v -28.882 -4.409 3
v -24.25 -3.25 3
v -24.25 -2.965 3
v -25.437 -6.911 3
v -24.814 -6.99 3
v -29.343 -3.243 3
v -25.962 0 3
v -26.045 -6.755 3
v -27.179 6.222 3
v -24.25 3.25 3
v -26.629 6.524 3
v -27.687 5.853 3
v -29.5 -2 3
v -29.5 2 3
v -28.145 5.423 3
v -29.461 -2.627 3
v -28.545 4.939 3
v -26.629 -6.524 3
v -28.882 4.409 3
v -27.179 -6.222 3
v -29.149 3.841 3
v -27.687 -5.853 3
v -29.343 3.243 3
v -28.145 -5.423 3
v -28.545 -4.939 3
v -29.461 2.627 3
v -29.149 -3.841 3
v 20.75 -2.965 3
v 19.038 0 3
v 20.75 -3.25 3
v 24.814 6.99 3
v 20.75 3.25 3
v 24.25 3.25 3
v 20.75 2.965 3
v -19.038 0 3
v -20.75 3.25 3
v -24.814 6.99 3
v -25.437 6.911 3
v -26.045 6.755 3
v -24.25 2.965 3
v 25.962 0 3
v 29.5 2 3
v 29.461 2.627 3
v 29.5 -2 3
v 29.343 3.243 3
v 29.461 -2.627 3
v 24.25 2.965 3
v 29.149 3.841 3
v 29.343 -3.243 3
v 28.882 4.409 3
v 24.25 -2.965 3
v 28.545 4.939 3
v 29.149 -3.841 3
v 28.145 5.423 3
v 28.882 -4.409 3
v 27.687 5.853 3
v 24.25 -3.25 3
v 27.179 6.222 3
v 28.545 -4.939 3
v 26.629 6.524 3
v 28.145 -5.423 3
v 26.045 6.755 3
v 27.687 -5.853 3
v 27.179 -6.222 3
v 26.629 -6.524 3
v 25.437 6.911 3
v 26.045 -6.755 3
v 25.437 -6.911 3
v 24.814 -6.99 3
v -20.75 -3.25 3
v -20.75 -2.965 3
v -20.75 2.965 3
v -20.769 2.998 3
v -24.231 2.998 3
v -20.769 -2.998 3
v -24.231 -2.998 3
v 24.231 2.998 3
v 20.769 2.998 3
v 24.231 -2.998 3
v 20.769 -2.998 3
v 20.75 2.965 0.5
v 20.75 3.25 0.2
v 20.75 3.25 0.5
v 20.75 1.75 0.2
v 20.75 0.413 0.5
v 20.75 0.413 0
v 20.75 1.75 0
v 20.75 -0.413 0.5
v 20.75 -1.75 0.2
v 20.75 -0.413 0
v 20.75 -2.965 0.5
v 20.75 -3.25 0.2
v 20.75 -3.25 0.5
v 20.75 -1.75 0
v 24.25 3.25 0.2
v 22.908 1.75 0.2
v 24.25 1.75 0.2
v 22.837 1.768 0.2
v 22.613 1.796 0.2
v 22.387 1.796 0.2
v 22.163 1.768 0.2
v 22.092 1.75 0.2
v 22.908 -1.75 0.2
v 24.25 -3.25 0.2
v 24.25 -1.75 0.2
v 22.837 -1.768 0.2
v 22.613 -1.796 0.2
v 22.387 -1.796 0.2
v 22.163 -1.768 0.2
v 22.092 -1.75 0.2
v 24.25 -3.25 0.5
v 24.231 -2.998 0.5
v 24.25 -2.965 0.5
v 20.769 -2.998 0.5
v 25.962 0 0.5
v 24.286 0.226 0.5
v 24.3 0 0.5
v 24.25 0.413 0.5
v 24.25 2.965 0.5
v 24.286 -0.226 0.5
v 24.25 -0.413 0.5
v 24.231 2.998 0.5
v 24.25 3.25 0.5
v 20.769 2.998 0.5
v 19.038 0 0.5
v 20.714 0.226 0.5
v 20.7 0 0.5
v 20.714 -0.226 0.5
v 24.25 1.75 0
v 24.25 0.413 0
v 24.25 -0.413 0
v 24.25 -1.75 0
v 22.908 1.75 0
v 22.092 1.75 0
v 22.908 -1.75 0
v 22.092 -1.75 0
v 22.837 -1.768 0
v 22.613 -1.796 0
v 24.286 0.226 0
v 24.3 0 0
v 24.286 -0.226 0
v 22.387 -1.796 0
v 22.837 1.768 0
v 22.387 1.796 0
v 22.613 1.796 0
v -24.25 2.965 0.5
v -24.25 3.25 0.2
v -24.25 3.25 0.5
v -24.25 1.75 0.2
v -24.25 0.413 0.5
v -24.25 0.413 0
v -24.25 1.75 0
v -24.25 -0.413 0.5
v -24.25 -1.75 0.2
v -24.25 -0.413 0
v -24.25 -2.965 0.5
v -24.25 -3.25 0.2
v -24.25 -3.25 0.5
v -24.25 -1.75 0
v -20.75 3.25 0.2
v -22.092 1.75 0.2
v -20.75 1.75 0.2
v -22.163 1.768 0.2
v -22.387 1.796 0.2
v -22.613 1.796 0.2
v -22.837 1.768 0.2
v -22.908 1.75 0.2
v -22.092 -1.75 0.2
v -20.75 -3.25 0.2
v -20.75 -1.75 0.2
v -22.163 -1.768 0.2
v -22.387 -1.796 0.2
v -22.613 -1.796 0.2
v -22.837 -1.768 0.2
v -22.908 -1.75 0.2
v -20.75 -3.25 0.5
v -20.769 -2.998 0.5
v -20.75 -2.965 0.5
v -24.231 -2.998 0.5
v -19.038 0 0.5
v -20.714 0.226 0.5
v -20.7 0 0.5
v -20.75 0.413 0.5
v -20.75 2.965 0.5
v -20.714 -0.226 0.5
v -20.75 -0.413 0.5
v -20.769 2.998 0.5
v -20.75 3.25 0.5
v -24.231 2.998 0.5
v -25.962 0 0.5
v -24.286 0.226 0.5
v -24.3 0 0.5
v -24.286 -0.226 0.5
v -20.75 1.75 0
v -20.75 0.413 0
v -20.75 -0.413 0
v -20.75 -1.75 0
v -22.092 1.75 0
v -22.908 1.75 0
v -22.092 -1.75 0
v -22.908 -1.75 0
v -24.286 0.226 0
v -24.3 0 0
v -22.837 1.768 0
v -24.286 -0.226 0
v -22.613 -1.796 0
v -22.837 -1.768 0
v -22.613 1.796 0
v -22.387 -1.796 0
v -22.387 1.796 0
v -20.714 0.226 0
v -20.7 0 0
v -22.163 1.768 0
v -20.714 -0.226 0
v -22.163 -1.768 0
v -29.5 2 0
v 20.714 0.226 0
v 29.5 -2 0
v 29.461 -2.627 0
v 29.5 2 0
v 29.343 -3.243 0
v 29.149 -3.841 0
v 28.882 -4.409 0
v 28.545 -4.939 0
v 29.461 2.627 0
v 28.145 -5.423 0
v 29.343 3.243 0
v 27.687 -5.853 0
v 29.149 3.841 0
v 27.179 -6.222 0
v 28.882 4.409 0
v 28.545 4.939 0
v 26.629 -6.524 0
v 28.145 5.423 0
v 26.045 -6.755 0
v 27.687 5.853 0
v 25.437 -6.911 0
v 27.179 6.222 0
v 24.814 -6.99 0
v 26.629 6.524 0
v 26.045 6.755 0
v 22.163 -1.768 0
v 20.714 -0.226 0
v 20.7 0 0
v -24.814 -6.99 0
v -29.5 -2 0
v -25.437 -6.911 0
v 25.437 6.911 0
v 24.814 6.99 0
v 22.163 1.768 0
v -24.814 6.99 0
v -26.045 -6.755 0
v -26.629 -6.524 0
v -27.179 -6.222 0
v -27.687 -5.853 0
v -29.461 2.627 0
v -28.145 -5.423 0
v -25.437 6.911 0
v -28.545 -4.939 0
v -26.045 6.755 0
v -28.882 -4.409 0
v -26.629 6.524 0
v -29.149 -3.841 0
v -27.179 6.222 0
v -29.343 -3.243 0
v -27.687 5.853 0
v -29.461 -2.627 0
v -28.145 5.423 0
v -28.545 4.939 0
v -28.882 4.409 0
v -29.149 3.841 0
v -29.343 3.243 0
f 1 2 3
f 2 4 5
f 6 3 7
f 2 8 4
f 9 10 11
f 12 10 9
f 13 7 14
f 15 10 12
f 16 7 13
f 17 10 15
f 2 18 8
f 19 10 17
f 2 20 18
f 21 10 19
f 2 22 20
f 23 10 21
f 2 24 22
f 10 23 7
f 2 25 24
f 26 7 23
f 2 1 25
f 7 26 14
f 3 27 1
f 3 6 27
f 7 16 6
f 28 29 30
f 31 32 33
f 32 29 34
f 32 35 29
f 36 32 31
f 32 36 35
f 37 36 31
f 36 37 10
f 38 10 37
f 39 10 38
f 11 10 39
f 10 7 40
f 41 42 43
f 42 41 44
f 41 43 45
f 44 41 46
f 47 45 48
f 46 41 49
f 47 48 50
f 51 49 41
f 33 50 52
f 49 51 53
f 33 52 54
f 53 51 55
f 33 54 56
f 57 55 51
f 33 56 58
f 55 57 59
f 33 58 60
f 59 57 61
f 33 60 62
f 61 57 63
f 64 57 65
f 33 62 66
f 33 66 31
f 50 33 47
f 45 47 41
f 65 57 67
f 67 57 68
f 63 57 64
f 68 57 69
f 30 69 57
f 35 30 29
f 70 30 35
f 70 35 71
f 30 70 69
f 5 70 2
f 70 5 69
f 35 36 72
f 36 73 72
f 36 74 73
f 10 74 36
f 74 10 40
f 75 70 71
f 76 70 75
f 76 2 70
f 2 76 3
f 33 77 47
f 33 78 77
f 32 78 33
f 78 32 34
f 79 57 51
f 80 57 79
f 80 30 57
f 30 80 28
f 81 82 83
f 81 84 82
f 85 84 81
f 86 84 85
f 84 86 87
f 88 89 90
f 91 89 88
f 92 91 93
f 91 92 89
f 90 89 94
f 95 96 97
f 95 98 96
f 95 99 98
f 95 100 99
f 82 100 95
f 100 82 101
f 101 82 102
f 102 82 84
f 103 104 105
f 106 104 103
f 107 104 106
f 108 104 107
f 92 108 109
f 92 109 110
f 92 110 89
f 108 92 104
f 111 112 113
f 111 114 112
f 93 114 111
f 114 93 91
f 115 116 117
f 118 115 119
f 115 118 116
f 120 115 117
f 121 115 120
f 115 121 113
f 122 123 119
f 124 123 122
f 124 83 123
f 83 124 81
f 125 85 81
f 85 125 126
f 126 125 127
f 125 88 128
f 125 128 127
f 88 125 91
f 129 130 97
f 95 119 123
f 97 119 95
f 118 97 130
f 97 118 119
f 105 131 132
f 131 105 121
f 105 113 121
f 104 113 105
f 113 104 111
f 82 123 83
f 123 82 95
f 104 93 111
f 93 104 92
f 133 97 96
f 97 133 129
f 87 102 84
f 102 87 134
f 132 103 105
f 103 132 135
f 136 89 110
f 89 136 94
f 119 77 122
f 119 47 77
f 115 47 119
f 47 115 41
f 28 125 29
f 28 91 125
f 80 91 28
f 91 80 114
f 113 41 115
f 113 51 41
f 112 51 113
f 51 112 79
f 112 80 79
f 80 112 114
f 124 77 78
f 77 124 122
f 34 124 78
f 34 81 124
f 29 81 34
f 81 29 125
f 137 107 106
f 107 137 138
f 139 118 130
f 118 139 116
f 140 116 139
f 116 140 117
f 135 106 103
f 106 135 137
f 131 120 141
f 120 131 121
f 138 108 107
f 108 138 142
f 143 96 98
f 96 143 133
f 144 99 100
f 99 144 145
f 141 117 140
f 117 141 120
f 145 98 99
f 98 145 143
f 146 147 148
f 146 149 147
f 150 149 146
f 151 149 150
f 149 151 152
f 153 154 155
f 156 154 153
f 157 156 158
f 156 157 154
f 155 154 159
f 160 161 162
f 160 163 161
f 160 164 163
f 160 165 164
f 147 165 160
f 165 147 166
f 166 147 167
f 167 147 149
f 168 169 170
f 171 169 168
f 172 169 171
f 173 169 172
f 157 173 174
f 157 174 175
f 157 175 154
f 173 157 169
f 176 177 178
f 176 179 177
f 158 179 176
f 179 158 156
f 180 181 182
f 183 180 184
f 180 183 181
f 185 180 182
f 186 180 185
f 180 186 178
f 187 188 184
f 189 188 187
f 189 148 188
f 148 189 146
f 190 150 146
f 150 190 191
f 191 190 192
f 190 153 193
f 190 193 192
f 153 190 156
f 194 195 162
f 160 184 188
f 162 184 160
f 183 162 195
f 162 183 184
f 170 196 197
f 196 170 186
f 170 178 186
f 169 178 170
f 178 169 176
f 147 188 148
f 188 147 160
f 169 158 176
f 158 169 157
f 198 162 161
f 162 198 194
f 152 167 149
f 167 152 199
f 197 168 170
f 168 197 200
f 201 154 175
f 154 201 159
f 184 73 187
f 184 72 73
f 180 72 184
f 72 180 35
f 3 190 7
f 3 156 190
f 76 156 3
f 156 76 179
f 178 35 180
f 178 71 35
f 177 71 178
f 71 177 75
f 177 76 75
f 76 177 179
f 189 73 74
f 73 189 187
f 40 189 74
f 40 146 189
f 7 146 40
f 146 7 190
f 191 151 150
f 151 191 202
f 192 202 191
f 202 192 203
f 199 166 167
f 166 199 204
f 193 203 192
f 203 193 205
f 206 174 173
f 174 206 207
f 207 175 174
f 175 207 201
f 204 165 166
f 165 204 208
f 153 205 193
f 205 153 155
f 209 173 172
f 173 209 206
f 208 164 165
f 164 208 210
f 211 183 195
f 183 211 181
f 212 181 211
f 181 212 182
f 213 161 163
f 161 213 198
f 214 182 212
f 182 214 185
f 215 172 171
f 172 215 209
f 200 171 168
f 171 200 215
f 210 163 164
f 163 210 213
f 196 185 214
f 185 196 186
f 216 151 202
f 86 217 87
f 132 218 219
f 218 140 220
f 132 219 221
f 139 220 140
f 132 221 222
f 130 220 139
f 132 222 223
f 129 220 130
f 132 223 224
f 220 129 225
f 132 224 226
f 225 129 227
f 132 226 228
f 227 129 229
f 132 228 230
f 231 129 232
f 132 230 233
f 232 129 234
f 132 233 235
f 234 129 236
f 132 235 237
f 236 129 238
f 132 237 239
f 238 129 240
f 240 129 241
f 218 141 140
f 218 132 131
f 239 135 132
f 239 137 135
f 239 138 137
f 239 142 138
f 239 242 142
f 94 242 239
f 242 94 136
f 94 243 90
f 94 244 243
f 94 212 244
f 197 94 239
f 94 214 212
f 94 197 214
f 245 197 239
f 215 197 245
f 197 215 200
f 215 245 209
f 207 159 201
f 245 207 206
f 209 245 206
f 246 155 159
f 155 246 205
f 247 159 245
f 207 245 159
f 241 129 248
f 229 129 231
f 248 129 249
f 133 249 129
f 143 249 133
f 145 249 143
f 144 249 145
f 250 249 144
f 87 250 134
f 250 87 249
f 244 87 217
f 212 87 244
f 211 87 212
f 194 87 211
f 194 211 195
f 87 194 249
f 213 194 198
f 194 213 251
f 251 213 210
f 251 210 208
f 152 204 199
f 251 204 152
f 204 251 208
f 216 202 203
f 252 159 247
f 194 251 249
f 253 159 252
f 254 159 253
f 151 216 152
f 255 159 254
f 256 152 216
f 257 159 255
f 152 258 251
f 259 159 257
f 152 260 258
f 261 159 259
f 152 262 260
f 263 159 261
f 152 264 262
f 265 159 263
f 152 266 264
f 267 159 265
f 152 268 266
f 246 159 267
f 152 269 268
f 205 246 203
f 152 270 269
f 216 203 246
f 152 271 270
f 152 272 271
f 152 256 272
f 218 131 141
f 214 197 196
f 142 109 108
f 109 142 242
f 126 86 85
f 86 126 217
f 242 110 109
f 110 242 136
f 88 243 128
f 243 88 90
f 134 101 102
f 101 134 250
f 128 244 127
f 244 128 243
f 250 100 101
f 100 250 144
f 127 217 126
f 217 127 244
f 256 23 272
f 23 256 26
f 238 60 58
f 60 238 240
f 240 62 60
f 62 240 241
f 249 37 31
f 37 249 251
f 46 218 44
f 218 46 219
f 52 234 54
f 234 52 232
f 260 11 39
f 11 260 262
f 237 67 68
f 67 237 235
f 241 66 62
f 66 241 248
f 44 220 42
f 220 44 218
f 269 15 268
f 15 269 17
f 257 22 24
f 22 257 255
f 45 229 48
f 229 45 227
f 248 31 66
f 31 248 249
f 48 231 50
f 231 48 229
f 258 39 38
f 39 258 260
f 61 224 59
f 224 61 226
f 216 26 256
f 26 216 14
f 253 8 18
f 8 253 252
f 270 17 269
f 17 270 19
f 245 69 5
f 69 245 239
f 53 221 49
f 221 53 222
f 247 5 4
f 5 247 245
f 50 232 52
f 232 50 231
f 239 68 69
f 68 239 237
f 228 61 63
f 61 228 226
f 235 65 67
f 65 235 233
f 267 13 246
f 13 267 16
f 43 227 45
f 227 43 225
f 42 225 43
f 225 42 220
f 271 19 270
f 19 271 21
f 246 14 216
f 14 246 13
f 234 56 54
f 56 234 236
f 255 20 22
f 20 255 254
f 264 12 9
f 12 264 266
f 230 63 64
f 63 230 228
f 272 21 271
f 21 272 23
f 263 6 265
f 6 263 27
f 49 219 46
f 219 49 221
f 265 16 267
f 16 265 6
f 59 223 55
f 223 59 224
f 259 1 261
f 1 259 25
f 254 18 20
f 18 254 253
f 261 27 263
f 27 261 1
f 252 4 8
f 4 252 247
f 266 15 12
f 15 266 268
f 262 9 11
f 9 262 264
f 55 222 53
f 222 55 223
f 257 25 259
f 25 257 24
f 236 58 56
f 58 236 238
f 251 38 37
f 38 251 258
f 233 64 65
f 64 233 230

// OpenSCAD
$fn = 50;


difference() {
	union() {
		hull() {
			translate(v = [-24.5000000000, 2.0000000000, 0]) {
				cylinder(h = 3, r = 5);
			}
			translate(v = [24.5000000000, 2.0000000000, 0]) {
				cylinder(h = 3, r = 5);
			}
			translate(v = [-24.5000000000, -2.0000000000, 0]) {
				cylinder(h = 3, r = 5);
			}
			translate(v = [24.5000000000, -2.0000000000, 0]) {
				cylinder(h = 3, r = 5);
			}
		}
	}
	union() {
		translate(v = [22.5000000000, 0, -20]) {
			rotate(a = [0, 180, 0]) {
				difference() {
					union() {
						translate(v = [0, 0, -23.0000000000]) {
							rotate(a = [0, 0, 0]) {
								difference() {
									union() {
										#translate(v = [-1.7500000000, -3.2500000000, -0.3000000000]) {
											cube(size = [3.5000000000, 6.5000000000, 0.3000000000]);
										}
										#translate(v = [-1.7500000000, -1.7500000000, -0.6000000000]) {
											cube(size = [3.5000000000, 3.5000000000, 0.3000000000]);
										}
										#translate(v = [-1.7500000000, -3.2500000000, 2.5000000000]) {
											cube(size = [3.5000000000, 6.5000000000, 0.3000000000]);
										}
										#translate(v = [-1.7500000000, -1.7500000000, 2.8000000000]) {
											cube(size = [3.5000000000, 3.5000000000, 0.3000000000]);
										}
										#linear_extrude(height = 2.5000000000) {
											polygon(points = [[3.4620000000, 0.0000000000], [1.7310000000, 2.9981799479], [-1.7310000000, 2.9981799479], [-3.4620000000, 0.0000000000], [-1.7310000000, -2.9981799479], [1.7310000000, -2.9981799479]]);
										}
										#translate(v = [-1.7500000000, -3.2500000000, -0.3000000000]) {
											cube(size = [3.5000000000, 6.5000000000, 0.3000000000]);
										}
										#translate(v = [-1.7500000000, -1.7500000000, -0.6000000000]) {
											cube(size = [3.5000000000, 3.5000000000, 0.3000000000]);
										}
										#translate(v = [-1.7500000000, -3.2500000000, 2.5000000000]) {
											cube(size = [3.5000000000, 6.5000000000, 0.3000000000]);
										}
										#translate(v = [-1.7500000000, -1.7500000000, 2.8000000000]) {
											cube(size = [3.5000000000, 3.5000000000, 0.3000000000]);
										}
										#translate(v = [-1.7500000000, -3.2500000000, -0.3000000000]) {
											cube(size = [3.5000000000, 6.5000000000, 0.3000000000]);
										}
										#translate(v = [-1.7500000000, -1.7500000000, -0.6000000000]) {
											cube(size = [3.5000000000, 3.5000000000, 0.3000000000]);
										}
										#translate(v = [-1.7500000000, -3.2500000000, 2.5000000000]) {
											cube(size = [3.5000000000, 6.5000000000, 0.3000000000]);
										}
										#translate(v = [-1.7500000000, -1.7500000000, 2.8000000000]) {
											cube(size = [3.5000000000, 3.5000000000, 0.3000000000]);
										}
									}
									union();
								}
							}
						}
						translate(v = [0, 0, -23.0000000000]) {
							rotate(a = [0, 0, 0]) {
								difference() {
									union() {
										#translate(v = [-1.7500000000, -3.2500000000, -0.3000000000]) {
											cube(size = [3.5000000000, 6.5000000000, 0.3000000000]);
										}
										#translate(v = [-1.7500000000, -1.7500000000, -0.6000000000]) {
											cube(size = [3.5000000000, 3.5000000000, 0.3000000000]);
										}
										#translate(v = [-1.7500000000, -3.2500000000, 2.5000000000]) {
											cube(size = [3.5000000000, 6.5000000000, 0.3000000000]);
										}
										#translate(v = [-1.7500000000, -1.7500000000, 2.8000000000]) {
											cube(size = [3.5000000000, 3.5000000000, 0.3000000000]);
										}
										#linear_extrude(height = 2.5000000000) {
											polygon(points = [[3.4620000000, 0.0000000000], [1.7310000000, 2.9981799479], [-1.7310000000, 2.9981799479], [-3.4620000000, 0.0000000000], [-1.7310000000, -2.9981799479], [1.7310000000, -2.9981799479]]);
										}
										#translate(v = [-1.7500000000, -3.2500000000, -0.3000000000]) {
											cube(size = [3.5000000000, 6.5000000000, 0.3000000000]);
										}
										#translate(v = [-1.7500000000, -1.7500000000, -0.6000000000]) {
											cube(size = [3.5000000000, 3.5000000000, 0.3000000000]);
										}
										#translate(v = [-1.7500000000, -3.2500000000, 2.5000000000]) {
											cube(size = [3.5000000000, 6.5000000000, 0.3000000000]);
										}
										#translate(v = [-1.7500000000, -1.7500000000, 2.8000000000]) {
											cube(size = [3.5000000000, 3.5000000000, 0.3000000000]);
										}
										#translate(v = [-1.7500000000, -3.2500000000, -0.3000000000]) {
											cube(size = [3.5000000000, 6.5000000000, 0.3000000000]);
										}
										#translate(v = [-1.7500000000, -1.7500000000, -0.6000000000]) {
											cube(size = [3.5000000000, 3.5000000000, 0.3000000000]);
										}
										#translate(v = [-1.7500000000, -3.2500000000, 2.5000000000]) {
											cube(size = [3.5000000000, 6.5000000000, 0.3000000000]);
										}
										#translate(v = [-1.7500000000, -1.7500000000, 2.8000000000]) {
											cube(size = [3.5000000000, 3.5000000000, 0.3000000000]);
										}
									}
									union();
								}
							}
						}
						translate(v = [0, 0, -23.0000000000]) {
							rotate(a = [0, 0, 0]) {
								difference() {
									union() {
										#translate(v = [-1.7500000000, -3.2500000000, -0.3000000000]) {
											cube(size = [3.5000000000, 6.5000000000, 0.3000000000]);
										}
										#translate(v = [-1.7500000000, -1.7500000000, -0.6000000000]) {
											cube(size = [3.5000000000, 3.5000000000, 0.3000000000]);
										}
										#translate(v = [-1.7500000000, -3.2500000000, 2.5000000000]) {
											cube(size = [3.5000000000, 6.5000000000, 0.3000000000]);
										}
										#translate(v = [-1.7500000000, -1.7500000000, 2.8000000000]) {
											cube(size = [3.5000000000, 3.5000000000, 0.3000000000]);
										}
										#linear_extrude(height = 2.5000000000) {
											polygon(points = [[3.4620000000, 0.0000000000], [1.7310000000, 2.9981799479], [-1.7310000000, 2.9981799479], [-3.4620000000, 0.0000000000], [-1.7310000000, -2.9981799479], [1.7310000000, -2.9981799479]]);
										}
										#translate(v = [-1.7500000000, -3.2500000000, -0.3000000000]) {
											cube(size = [3.5000000000, 6.5000000000, 0.3000000000]);
										}
										#translate(v = [-1.7500000000, -1.7500000000, -0.6000000000]) {
											cube(size = [3.5000000000, 3.5000000000, 0.3000000000]);
										}
										#translate(v = [-1.7500000000, -3.2500000000, 2.5000000000]) {
											cube(size = [3.5000000000, 6.5000000000, 0.3000000000]);
										}
										#translate(v = [-1.7500000000, -1.7500000000, 2.8000000000]) {
											cube(size = [3.5000000000, 3.5000000000, 0.3000000000]);
										}
										#translate(v = [-1.7500000000, -3.2500000000, -0.3000000000]) {
											cube(size = [3.5000000000, 6.5000000000, 0.3000000000]);
										}
										#translate(v = [-1.7500000000, -1.7500000000, -0.6000000000]) {
											cube(size = [3.5000000000, 3.5000000000, 0.3000000000]);
										}
										#translate(v = [-1.7500000000, -3.2500000000, 2.5000000000]) {
											cube(size = [3.5000000000, 6.5000000000, 0.3000000000]);
										}
										#translate(v = [-1.7500000000, -1.7500000000, 2.8000000000]) {
											cube(size = [3.5000000000, 3.5000000000, 0.3000000000]);
										}
									}
									union();
								}
							}
						}
						#translate(v = [0, 0, -23.0000000000]) {
							cylinder(h = 23, r = 1.5000000000);
						}
						#translate(v = [0, 0, -1.9000000000]) {
							cylinder(h = 1.9000000000, r1 = 1.8000000000, r2 = 3.6000000000);
						}
						#translate(v = [0, 0, -23.0000000000]) {
							cylinder(h = 23, r = 1.8000000000);
						}
						#translate(v = [0, 0, -23.0000000000]) {
							cylinder(h = 23, r = 1.5000000000);
						}
					}
					union();
				}
			}
		}
		translate(v = [-22.5000000000, 0, -20]) {
			rotate(a = [0, 180, 0]) {
				difference() {
					union() {
						translate(v = [0, 0, -23.0000000000]) {
							rotate(a = [0, 0, 0]) {
								difference() {
									union() {
										#translate(v = [-1.7500000000, -3.2500000000, -0.3000000000]) {
											cube(size = [3.5000000000, 6.5000000000, 0.3000000000]);
										}
										#translate(v = [-1.7500000000, -1.7500000000, -0.6000000000]) {
											cube(size = [3.5000000000, 3.5000000000, 0.3000000000]);
										}
										#translate(v = [-1.7500000000, -3.2500000000, 2.5000000000]) {
											cube(size = [3.5000000000, 6.5000000000, 0.3000000000]);
										}
										#translate(v = [-1.7500000000, -1.7500000000, 2.8000000000]) {
											cube(size = [3.5000000000, 3.5000000000, 0.3000000000]);
										}
										#linear_extrude(height = 2.5000000000) {
											polygon(points = [[3.4620000000, 0.0000000000], [1.7310000000, 2.9981799479], [-1.7310000000, 2.9981799479], [-3.4620000000, 0.0000000000], [-1.7310000000, -2.9981799479], [1.7310000000, -2.9981799479]]);
										}
										#translate(v = [-1.7500000000, -3.2500000000, -0.3000000000]) {
											cube(size = [3.5000000000, 6.5000000000, 0.3000000000]);
										}
										#translate(v = [-1.7500000000, -1.7500000000, -0.6000000000]) {
											cube(size = [3.5000000000, 3.5000000000, 0.3000000000]);
										}
										#translate(v = [-1.7500000000, -3.2500000000, 2.5000000000]) {
											cube(size = [3.5000000000, 6.5000000000, 0.3000000000]);
										}
										#translate(v = [-1.7500000000, -1.7500000000, 2.8000000000]) {
											cube(size = [3.5000000000, 3.5000000000, 0.3000000000]);
										}
										#translate(v = [-1.7500000000, -3.2500000000, -0.3000000000]) {
											cube(size = [3.5000000000, 6.5000000000, 0.3000000000]);
										}
										#translate(v = [-1.7500000000, -1.7500000000, -0.6000000000]) {
											cube(size = [3.5000000000, 3.5000000000, 0.3000000000]);
										}
										#translate(v = [-1.7500000000, -3.2500000000, 2.5000000000]) {
											cube(size = [3.5000000000, 6.5000000000, 0.3000000000]);
										}
										#translate(v = [-1.7500000000, -1.7500000000, 2.8000000000]) {
											cube(size = [3.5000000000, 3.5000000000, 0.3000000000]);
										}
									}
									union();
								}
							}
						}
						translate(v = [0, 0, -23.0000000000]) {
							rotate(a = [0, 0, 0]) {
								difference() {
									union() {
										#translate(v = [-1.7500000000, -3.2500000000, -0.3000000000]) {
											cube(size = [3.5000000000, 6.5000000000, 0.3000000000]);
										}
										#translate(v = [-1.7500000000, -1.7500000000, -0.6000000000]) {
											cube(size = [3.5000000000, 3.5000000000, 0.3000000000]);
										}
										#translate(v = [-1.7500000000, -3.2500000000, 2.5000000000]) {
											cube(size = [3.5000000000, 6.5000000000, 0.3000000000]);
										}
										#translate(v = [-1.7500000000, -1.7500000000, 2.8000000000]) {
											cube(size = [3.5000000000, 3.5000000000, 0.3000000000]);
										}
										#linear_extrude(height = 2.5000000000) {
											polygon(points = [[3.4620000000, 0.0000000000], [1.7310000000, 2.9981799479], [-1.7310000000, 2.9981799479], [-3.4620000000, 0.0000000000], [-1.7310000000, -2.9981799479], [1.7310000000, -2.9981799479]]);
										}
										#translate(v = [-1.7500000000, -3.2500000000, -0.3000000000]) {
											cube(size = [3.5000000000, 6.5000000000, 0.3000000000]);
										}
										#translate(v = [-1.7500000000, -1.7500000000, -0.6000000000]) {
											cube(size = [3.5000000000, 3.5000000000, 0.3000000000]);
										}
										#translate(v = [-1.7500000000, -3.2500000000, 2.5000000000]) {
											cube(size = [3.5000000000, 6.5000000000, 0.3000000000]);
										}
										#translate(v = [-1.7500000000, -1.7500000000, 2.8000000000]) {
											cube(size = [3.5000000000, 3.5000000000, 0.3000000000]);
										}
										#translate(v = [-1.7500000000, -3.2500000000, -0.3000000000]) {
											cube(size = [3.5000000000, 6.5000000000, 0.3000000000]);
										}
										#translate(v = [-1.7500000000, -1.7500000000, -0.6000000000]) {
											cube(size = [3.5000000000, 3.5000000000, 0.3000000000]);
										}
										#translate(v = [-1.7500000000, -3.2500000000, 2.5000000000]) {
											cube(size = [3.5000000000, 6.5000000000, 0.3000000000]);
										}
										#translate(v = [-1.7500000000, -1.7500000000, 2.8000000000]) {
											cube(size = [3.5000000000, 3.5000000000, 0.3000000000]);
										}
									}
									union();
								}
							}
						}
						translate(v = [0, 0, -23.0000000000]) {
							rotate(a = [0, 0, 0]) {
								difference() {
									union() {
										#translate(v = [-1.7500000000, -3.2500000000, -0.3000000000]) {
											cube(size = [3.5000000000, 6.5000000000, 0.3000000000]);
										}
										#translate(v = [-1.7500000000, -1.7500000000, -0.6000000000]) {
											cube(size = [3.5000000000, 3.5000000000, 0.3000000000]);
										}
										#translate(v = [-1.7500000000, -3.2500000000, 2.5000000000]) {
											cube(size = [3.5000000000, 6.5000000000, 0.3000000000]);
										}
										#translate(v = [-1.7500000000, -1.7500000000, 2.8000000000]) {
											cube(size = [3.5000000000, 3.5000000000, 0.3000000000]);
										}
										#linear_extrude(height = 2.5000000000) {
											polygon(points = [[3.4620000000, 0.0000000000], [1.7310000000, 2.9981799479], [-1.7310000000, 2.9981799479], [-3.4620000000, 0.0000000000], [-1.7310000000, -2.9981799479], [1.7310000000, -2.9981799479]]);
										}
										#translate(v = [-1.7500000000, -3.2500000000, -0.3000000000]) {
											cube(size = [3.5000000000, 6.5000000000, 0.3000000000]);
										}
										#translate(v = [-1.7500000000, -1.7500000000, -0.6000000000]) {
											cube(size = [3.5000000000, 3.5000000000, 0.3000000000]);
										}
										#translate(v = [-1.7500000000, -3.2500000000, 2.5000000000]) {
											cube(size = [3.5000000000, 6.5000000000, 0.3000000000]);
										}
										#translate(v = [-1.7500000000, -1.7500000000, 2.8000000000]) {
											cube(size = [3.5000000000, 3.5000000000, 0.3000000000]);
										}
										#translate(v = [-1.7500000000, -3.2500000000, -0.3000000000]) {
											cube(size = [3.5000000000, 6.5000000000, 0.3000000000]);
										}
										#translate(v = [-1.7500000000, -1.7500000000, -0.6000000000]) {
											cube(size = [3.5000000000, 3.5000000000, 0.3000000000]);
										}
										#translate(v = [-1.7500000000, -3.2500000000, 2.5000000000]) {
											cube(size = [3.5000000000, 6.5000000000, 0.3000000000]);
										}
										#translate(v = [-1.7500000000, -1.7500000000, 2.8000000000]) {
											cube(size = [3.5000000000, 3.5000000000, 0.3000000000]);
										}
									}
									union();
								}
							}
						}
						#translate(v = [0, 0, -23.0000000000]) {
							cylinder(h = 23, r = 1.5000000000);
						}
						#translate(v = [0, 0, -1.9000000000]) {
							cylinder(h = 1.9000000000, r1 = 1.8000000000, r2 = 3.6000000000);
						}
						#translate(v = [0, 0, -23.0000000000]) {
							cylinder(h = 23, r = 1.8000000000);
						}
						#translate(v = [0, 0, -23.0000000000]) {
							cylinder(h = 23, r = 1.5000000000);
						}
					}
					union();
				}
			}
		}
		translate(v = [-22.5000000000, 0.0000000000, 0]) {
			cylinder(h = 3, r = 1.8000000000);
		}
		translate(v = [22.5000000000, 0.0000000000, 0]) {
			cylinder(h = 3, r = 1.8000000000);
		}
		translate(v = [-22.5000000000, 0.0000000000, 0]) {
			cylinder(h = 3, r = 1.8000000000);
		}
		translate(v = [22.5000000000, 0.0000000000, 0]) {
			cylinder(h = 3, r = 1.8000000000);
		}
		translate(v = [-22.5000000000, 0.0000000000, 0]) {
			cylinder(h = 3, r = 1.8000000000);
		}
		translate(v = [22.5000000000, 0.0000000000, 0]) {
			cylinder(h = 3, r = 1.8000000000);
		}
		translate(v = [-22.5000000000, 0.0000000000, 0]) {
			cylinder(h = 3, r = 1.8000000000);
		}
		translate(v = [22.5000000000, 0.0000000000, 0]) {
			cylinder(h = 3, r = 1.8000000000);
		}
	}
}
